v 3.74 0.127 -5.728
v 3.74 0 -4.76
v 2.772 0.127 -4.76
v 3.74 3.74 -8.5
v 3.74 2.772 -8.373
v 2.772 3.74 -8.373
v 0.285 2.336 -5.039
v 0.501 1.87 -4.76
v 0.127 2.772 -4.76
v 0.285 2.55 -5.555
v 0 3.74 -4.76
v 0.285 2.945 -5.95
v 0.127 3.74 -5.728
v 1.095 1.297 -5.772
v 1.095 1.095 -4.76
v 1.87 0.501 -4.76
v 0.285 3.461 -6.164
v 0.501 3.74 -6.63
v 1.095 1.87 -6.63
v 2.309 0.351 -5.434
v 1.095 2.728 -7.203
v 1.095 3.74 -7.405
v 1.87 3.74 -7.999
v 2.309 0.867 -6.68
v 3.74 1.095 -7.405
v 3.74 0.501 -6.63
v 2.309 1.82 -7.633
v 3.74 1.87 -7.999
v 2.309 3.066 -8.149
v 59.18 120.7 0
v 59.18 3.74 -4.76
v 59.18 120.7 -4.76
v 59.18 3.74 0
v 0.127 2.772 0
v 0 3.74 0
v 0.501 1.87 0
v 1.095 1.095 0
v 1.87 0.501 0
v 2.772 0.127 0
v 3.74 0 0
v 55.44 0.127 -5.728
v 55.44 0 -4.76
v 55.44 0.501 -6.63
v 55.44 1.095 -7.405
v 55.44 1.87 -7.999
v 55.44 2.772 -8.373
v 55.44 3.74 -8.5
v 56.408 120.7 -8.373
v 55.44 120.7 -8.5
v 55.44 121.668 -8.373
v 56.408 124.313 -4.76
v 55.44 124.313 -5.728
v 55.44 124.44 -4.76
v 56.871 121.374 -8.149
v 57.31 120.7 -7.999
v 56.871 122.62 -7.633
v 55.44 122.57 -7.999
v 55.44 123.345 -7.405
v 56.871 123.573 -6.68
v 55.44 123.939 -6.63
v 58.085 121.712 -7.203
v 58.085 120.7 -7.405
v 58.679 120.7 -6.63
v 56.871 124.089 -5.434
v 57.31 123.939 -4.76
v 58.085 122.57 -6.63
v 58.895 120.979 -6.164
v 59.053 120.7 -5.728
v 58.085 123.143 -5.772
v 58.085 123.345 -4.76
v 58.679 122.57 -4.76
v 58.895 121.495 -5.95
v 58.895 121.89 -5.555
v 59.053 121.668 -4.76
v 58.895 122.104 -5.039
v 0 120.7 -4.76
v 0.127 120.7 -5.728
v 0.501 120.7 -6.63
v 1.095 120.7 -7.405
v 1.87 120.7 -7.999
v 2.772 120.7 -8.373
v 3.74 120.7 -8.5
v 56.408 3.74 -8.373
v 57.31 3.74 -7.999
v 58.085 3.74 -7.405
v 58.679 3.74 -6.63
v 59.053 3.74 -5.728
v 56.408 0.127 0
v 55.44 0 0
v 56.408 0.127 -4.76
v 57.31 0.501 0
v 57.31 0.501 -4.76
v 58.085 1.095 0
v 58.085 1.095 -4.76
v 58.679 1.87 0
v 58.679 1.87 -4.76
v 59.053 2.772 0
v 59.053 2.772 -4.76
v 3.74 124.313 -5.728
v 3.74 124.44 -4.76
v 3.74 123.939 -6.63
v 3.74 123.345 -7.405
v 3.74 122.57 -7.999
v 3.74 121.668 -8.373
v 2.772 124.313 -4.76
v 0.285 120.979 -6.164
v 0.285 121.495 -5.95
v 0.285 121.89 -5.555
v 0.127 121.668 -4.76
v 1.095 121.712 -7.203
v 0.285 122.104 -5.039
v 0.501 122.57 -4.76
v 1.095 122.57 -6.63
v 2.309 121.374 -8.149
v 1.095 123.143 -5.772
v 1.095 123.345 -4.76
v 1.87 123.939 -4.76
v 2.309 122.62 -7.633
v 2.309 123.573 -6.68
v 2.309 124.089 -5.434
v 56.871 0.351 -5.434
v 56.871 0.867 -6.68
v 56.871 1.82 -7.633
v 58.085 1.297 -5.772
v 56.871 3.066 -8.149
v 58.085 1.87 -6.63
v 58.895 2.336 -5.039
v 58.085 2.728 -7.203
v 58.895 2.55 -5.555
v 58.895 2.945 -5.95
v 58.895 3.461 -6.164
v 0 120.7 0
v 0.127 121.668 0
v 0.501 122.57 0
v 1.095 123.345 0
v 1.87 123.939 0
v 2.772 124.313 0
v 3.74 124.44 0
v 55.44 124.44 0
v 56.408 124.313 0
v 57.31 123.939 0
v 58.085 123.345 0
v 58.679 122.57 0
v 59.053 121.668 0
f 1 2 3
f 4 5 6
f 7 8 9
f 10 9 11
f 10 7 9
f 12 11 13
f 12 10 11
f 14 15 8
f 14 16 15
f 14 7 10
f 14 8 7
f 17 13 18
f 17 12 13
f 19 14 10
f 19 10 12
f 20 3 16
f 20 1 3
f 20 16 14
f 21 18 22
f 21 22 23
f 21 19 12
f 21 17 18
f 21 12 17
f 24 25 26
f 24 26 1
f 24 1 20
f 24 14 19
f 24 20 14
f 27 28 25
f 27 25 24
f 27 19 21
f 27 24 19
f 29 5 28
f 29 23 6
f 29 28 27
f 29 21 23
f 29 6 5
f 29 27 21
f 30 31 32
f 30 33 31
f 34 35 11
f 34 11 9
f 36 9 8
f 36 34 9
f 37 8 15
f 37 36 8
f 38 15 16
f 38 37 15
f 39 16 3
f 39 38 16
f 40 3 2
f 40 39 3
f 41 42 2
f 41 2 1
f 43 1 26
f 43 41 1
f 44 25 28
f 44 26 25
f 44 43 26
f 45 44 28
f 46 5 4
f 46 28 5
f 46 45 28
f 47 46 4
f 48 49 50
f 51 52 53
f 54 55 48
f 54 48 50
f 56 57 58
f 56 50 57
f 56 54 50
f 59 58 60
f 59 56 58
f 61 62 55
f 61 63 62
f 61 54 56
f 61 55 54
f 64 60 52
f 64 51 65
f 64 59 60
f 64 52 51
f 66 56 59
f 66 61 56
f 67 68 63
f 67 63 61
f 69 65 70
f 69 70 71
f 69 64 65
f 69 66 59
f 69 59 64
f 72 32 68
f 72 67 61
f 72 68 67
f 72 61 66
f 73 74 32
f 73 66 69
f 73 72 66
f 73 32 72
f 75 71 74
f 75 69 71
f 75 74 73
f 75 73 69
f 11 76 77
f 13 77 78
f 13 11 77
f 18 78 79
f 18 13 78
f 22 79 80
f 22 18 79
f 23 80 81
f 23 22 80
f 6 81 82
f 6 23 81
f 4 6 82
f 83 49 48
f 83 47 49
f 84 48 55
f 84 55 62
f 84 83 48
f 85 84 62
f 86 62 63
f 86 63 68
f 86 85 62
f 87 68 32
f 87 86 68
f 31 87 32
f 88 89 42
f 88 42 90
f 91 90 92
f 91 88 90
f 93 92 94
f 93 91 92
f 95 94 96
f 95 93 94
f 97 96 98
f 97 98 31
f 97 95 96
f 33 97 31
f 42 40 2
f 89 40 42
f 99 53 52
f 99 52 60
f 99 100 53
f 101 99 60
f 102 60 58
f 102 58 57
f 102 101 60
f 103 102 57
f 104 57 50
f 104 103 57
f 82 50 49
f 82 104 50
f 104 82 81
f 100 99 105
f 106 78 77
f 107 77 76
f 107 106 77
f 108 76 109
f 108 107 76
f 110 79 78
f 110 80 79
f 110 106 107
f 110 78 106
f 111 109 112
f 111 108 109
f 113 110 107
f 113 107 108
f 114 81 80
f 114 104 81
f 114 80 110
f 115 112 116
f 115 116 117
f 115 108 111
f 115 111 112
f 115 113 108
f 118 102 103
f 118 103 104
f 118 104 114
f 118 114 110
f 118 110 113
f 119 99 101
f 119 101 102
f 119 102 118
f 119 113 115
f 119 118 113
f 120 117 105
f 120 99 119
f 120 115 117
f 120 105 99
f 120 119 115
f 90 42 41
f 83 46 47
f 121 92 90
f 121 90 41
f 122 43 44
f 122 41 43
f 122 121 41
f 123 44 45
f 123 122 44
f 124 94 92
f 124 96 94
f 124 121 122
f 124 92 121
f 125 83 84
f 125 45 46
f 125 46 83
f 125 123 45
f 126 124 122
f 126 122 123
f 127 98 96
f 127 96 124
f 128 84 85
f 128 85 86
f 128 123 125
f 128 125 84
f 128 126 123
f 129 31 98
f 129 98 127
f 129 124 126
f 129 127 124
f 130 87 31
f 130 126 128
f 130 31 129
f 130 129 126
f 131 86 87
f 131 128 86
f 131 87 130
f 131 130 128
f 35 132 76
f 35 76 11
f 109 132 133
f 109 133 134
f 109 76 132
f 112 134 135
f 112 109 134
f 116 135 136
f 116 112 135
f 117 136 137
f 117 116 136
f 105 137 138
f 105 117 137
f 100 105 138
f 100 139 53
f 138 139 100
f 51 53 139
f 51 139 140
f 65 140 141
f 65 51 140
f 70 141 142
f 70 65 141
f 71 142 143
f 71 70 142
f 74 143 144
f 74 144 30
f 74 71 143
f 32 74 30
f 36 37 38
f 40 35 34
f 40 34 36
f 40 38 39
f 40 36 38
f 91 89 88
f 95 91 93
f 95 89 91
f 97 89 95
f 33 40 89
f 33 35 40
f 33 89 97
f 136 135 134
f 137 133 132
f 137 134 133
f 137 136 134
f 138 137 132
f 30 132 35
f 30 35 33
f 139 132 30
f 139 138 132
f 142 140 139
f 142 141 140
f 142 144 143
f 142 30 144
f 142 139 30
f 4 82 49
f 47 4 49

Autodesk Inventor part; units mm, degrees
ref_plane "YZ Plane" through (0, 0, 0) normal (1, 0, 0) x (0, 1, 0)
ref_plane "XZ Plane" through (0, 0, 0) normal (0, 1, 0) x (-1, 0, 0)
ref_plane "XY Plane" through (0, 0, 0) normal (0, 0, 1) x (1, 0, 0)
sketch "Sketch1" plane through (0, 0, 0) normal (0, 0, 1) x (1, 0, 0)
  line L0 (0, 0) -> (59.18, 0)
  line L1 (59.18, 0) -> (59.18, 124.44)
  line L2 (59.18, 124.44) -> (0, 124.44)
  line L3 (0, 124.44) -> (0, 0)
  dimension "d0" = 59.18
  dimension "d1" = 124.44
extrude "Extrusion1" add sketch "Sketch1" against normal blind 8.5
fillet "Fillet1" radius 3.74 1 edges at (29.59, 124.44, -8.5)
fillet "Fillet2" radius 3.74 1 edges at (29.59, 0, -8.5)
fillet "Fillet3" radius 3.74 5 edges at (59.18, 1.0954, -7.4046) (59.18, 0, -2.38) (59.18, 123.3446, -7.4046) (59.18, 124.44, -2.38) (59.18, 62.22, -8.5)
fillet "Fillet4" radius 3.74 5 edges at (0, 123.3446, -7.4046) (0, 124.44, -2.38) (0, 1.0954, -7.4046) (0, 0, -2.38) (0, 62.22, -8.5)
